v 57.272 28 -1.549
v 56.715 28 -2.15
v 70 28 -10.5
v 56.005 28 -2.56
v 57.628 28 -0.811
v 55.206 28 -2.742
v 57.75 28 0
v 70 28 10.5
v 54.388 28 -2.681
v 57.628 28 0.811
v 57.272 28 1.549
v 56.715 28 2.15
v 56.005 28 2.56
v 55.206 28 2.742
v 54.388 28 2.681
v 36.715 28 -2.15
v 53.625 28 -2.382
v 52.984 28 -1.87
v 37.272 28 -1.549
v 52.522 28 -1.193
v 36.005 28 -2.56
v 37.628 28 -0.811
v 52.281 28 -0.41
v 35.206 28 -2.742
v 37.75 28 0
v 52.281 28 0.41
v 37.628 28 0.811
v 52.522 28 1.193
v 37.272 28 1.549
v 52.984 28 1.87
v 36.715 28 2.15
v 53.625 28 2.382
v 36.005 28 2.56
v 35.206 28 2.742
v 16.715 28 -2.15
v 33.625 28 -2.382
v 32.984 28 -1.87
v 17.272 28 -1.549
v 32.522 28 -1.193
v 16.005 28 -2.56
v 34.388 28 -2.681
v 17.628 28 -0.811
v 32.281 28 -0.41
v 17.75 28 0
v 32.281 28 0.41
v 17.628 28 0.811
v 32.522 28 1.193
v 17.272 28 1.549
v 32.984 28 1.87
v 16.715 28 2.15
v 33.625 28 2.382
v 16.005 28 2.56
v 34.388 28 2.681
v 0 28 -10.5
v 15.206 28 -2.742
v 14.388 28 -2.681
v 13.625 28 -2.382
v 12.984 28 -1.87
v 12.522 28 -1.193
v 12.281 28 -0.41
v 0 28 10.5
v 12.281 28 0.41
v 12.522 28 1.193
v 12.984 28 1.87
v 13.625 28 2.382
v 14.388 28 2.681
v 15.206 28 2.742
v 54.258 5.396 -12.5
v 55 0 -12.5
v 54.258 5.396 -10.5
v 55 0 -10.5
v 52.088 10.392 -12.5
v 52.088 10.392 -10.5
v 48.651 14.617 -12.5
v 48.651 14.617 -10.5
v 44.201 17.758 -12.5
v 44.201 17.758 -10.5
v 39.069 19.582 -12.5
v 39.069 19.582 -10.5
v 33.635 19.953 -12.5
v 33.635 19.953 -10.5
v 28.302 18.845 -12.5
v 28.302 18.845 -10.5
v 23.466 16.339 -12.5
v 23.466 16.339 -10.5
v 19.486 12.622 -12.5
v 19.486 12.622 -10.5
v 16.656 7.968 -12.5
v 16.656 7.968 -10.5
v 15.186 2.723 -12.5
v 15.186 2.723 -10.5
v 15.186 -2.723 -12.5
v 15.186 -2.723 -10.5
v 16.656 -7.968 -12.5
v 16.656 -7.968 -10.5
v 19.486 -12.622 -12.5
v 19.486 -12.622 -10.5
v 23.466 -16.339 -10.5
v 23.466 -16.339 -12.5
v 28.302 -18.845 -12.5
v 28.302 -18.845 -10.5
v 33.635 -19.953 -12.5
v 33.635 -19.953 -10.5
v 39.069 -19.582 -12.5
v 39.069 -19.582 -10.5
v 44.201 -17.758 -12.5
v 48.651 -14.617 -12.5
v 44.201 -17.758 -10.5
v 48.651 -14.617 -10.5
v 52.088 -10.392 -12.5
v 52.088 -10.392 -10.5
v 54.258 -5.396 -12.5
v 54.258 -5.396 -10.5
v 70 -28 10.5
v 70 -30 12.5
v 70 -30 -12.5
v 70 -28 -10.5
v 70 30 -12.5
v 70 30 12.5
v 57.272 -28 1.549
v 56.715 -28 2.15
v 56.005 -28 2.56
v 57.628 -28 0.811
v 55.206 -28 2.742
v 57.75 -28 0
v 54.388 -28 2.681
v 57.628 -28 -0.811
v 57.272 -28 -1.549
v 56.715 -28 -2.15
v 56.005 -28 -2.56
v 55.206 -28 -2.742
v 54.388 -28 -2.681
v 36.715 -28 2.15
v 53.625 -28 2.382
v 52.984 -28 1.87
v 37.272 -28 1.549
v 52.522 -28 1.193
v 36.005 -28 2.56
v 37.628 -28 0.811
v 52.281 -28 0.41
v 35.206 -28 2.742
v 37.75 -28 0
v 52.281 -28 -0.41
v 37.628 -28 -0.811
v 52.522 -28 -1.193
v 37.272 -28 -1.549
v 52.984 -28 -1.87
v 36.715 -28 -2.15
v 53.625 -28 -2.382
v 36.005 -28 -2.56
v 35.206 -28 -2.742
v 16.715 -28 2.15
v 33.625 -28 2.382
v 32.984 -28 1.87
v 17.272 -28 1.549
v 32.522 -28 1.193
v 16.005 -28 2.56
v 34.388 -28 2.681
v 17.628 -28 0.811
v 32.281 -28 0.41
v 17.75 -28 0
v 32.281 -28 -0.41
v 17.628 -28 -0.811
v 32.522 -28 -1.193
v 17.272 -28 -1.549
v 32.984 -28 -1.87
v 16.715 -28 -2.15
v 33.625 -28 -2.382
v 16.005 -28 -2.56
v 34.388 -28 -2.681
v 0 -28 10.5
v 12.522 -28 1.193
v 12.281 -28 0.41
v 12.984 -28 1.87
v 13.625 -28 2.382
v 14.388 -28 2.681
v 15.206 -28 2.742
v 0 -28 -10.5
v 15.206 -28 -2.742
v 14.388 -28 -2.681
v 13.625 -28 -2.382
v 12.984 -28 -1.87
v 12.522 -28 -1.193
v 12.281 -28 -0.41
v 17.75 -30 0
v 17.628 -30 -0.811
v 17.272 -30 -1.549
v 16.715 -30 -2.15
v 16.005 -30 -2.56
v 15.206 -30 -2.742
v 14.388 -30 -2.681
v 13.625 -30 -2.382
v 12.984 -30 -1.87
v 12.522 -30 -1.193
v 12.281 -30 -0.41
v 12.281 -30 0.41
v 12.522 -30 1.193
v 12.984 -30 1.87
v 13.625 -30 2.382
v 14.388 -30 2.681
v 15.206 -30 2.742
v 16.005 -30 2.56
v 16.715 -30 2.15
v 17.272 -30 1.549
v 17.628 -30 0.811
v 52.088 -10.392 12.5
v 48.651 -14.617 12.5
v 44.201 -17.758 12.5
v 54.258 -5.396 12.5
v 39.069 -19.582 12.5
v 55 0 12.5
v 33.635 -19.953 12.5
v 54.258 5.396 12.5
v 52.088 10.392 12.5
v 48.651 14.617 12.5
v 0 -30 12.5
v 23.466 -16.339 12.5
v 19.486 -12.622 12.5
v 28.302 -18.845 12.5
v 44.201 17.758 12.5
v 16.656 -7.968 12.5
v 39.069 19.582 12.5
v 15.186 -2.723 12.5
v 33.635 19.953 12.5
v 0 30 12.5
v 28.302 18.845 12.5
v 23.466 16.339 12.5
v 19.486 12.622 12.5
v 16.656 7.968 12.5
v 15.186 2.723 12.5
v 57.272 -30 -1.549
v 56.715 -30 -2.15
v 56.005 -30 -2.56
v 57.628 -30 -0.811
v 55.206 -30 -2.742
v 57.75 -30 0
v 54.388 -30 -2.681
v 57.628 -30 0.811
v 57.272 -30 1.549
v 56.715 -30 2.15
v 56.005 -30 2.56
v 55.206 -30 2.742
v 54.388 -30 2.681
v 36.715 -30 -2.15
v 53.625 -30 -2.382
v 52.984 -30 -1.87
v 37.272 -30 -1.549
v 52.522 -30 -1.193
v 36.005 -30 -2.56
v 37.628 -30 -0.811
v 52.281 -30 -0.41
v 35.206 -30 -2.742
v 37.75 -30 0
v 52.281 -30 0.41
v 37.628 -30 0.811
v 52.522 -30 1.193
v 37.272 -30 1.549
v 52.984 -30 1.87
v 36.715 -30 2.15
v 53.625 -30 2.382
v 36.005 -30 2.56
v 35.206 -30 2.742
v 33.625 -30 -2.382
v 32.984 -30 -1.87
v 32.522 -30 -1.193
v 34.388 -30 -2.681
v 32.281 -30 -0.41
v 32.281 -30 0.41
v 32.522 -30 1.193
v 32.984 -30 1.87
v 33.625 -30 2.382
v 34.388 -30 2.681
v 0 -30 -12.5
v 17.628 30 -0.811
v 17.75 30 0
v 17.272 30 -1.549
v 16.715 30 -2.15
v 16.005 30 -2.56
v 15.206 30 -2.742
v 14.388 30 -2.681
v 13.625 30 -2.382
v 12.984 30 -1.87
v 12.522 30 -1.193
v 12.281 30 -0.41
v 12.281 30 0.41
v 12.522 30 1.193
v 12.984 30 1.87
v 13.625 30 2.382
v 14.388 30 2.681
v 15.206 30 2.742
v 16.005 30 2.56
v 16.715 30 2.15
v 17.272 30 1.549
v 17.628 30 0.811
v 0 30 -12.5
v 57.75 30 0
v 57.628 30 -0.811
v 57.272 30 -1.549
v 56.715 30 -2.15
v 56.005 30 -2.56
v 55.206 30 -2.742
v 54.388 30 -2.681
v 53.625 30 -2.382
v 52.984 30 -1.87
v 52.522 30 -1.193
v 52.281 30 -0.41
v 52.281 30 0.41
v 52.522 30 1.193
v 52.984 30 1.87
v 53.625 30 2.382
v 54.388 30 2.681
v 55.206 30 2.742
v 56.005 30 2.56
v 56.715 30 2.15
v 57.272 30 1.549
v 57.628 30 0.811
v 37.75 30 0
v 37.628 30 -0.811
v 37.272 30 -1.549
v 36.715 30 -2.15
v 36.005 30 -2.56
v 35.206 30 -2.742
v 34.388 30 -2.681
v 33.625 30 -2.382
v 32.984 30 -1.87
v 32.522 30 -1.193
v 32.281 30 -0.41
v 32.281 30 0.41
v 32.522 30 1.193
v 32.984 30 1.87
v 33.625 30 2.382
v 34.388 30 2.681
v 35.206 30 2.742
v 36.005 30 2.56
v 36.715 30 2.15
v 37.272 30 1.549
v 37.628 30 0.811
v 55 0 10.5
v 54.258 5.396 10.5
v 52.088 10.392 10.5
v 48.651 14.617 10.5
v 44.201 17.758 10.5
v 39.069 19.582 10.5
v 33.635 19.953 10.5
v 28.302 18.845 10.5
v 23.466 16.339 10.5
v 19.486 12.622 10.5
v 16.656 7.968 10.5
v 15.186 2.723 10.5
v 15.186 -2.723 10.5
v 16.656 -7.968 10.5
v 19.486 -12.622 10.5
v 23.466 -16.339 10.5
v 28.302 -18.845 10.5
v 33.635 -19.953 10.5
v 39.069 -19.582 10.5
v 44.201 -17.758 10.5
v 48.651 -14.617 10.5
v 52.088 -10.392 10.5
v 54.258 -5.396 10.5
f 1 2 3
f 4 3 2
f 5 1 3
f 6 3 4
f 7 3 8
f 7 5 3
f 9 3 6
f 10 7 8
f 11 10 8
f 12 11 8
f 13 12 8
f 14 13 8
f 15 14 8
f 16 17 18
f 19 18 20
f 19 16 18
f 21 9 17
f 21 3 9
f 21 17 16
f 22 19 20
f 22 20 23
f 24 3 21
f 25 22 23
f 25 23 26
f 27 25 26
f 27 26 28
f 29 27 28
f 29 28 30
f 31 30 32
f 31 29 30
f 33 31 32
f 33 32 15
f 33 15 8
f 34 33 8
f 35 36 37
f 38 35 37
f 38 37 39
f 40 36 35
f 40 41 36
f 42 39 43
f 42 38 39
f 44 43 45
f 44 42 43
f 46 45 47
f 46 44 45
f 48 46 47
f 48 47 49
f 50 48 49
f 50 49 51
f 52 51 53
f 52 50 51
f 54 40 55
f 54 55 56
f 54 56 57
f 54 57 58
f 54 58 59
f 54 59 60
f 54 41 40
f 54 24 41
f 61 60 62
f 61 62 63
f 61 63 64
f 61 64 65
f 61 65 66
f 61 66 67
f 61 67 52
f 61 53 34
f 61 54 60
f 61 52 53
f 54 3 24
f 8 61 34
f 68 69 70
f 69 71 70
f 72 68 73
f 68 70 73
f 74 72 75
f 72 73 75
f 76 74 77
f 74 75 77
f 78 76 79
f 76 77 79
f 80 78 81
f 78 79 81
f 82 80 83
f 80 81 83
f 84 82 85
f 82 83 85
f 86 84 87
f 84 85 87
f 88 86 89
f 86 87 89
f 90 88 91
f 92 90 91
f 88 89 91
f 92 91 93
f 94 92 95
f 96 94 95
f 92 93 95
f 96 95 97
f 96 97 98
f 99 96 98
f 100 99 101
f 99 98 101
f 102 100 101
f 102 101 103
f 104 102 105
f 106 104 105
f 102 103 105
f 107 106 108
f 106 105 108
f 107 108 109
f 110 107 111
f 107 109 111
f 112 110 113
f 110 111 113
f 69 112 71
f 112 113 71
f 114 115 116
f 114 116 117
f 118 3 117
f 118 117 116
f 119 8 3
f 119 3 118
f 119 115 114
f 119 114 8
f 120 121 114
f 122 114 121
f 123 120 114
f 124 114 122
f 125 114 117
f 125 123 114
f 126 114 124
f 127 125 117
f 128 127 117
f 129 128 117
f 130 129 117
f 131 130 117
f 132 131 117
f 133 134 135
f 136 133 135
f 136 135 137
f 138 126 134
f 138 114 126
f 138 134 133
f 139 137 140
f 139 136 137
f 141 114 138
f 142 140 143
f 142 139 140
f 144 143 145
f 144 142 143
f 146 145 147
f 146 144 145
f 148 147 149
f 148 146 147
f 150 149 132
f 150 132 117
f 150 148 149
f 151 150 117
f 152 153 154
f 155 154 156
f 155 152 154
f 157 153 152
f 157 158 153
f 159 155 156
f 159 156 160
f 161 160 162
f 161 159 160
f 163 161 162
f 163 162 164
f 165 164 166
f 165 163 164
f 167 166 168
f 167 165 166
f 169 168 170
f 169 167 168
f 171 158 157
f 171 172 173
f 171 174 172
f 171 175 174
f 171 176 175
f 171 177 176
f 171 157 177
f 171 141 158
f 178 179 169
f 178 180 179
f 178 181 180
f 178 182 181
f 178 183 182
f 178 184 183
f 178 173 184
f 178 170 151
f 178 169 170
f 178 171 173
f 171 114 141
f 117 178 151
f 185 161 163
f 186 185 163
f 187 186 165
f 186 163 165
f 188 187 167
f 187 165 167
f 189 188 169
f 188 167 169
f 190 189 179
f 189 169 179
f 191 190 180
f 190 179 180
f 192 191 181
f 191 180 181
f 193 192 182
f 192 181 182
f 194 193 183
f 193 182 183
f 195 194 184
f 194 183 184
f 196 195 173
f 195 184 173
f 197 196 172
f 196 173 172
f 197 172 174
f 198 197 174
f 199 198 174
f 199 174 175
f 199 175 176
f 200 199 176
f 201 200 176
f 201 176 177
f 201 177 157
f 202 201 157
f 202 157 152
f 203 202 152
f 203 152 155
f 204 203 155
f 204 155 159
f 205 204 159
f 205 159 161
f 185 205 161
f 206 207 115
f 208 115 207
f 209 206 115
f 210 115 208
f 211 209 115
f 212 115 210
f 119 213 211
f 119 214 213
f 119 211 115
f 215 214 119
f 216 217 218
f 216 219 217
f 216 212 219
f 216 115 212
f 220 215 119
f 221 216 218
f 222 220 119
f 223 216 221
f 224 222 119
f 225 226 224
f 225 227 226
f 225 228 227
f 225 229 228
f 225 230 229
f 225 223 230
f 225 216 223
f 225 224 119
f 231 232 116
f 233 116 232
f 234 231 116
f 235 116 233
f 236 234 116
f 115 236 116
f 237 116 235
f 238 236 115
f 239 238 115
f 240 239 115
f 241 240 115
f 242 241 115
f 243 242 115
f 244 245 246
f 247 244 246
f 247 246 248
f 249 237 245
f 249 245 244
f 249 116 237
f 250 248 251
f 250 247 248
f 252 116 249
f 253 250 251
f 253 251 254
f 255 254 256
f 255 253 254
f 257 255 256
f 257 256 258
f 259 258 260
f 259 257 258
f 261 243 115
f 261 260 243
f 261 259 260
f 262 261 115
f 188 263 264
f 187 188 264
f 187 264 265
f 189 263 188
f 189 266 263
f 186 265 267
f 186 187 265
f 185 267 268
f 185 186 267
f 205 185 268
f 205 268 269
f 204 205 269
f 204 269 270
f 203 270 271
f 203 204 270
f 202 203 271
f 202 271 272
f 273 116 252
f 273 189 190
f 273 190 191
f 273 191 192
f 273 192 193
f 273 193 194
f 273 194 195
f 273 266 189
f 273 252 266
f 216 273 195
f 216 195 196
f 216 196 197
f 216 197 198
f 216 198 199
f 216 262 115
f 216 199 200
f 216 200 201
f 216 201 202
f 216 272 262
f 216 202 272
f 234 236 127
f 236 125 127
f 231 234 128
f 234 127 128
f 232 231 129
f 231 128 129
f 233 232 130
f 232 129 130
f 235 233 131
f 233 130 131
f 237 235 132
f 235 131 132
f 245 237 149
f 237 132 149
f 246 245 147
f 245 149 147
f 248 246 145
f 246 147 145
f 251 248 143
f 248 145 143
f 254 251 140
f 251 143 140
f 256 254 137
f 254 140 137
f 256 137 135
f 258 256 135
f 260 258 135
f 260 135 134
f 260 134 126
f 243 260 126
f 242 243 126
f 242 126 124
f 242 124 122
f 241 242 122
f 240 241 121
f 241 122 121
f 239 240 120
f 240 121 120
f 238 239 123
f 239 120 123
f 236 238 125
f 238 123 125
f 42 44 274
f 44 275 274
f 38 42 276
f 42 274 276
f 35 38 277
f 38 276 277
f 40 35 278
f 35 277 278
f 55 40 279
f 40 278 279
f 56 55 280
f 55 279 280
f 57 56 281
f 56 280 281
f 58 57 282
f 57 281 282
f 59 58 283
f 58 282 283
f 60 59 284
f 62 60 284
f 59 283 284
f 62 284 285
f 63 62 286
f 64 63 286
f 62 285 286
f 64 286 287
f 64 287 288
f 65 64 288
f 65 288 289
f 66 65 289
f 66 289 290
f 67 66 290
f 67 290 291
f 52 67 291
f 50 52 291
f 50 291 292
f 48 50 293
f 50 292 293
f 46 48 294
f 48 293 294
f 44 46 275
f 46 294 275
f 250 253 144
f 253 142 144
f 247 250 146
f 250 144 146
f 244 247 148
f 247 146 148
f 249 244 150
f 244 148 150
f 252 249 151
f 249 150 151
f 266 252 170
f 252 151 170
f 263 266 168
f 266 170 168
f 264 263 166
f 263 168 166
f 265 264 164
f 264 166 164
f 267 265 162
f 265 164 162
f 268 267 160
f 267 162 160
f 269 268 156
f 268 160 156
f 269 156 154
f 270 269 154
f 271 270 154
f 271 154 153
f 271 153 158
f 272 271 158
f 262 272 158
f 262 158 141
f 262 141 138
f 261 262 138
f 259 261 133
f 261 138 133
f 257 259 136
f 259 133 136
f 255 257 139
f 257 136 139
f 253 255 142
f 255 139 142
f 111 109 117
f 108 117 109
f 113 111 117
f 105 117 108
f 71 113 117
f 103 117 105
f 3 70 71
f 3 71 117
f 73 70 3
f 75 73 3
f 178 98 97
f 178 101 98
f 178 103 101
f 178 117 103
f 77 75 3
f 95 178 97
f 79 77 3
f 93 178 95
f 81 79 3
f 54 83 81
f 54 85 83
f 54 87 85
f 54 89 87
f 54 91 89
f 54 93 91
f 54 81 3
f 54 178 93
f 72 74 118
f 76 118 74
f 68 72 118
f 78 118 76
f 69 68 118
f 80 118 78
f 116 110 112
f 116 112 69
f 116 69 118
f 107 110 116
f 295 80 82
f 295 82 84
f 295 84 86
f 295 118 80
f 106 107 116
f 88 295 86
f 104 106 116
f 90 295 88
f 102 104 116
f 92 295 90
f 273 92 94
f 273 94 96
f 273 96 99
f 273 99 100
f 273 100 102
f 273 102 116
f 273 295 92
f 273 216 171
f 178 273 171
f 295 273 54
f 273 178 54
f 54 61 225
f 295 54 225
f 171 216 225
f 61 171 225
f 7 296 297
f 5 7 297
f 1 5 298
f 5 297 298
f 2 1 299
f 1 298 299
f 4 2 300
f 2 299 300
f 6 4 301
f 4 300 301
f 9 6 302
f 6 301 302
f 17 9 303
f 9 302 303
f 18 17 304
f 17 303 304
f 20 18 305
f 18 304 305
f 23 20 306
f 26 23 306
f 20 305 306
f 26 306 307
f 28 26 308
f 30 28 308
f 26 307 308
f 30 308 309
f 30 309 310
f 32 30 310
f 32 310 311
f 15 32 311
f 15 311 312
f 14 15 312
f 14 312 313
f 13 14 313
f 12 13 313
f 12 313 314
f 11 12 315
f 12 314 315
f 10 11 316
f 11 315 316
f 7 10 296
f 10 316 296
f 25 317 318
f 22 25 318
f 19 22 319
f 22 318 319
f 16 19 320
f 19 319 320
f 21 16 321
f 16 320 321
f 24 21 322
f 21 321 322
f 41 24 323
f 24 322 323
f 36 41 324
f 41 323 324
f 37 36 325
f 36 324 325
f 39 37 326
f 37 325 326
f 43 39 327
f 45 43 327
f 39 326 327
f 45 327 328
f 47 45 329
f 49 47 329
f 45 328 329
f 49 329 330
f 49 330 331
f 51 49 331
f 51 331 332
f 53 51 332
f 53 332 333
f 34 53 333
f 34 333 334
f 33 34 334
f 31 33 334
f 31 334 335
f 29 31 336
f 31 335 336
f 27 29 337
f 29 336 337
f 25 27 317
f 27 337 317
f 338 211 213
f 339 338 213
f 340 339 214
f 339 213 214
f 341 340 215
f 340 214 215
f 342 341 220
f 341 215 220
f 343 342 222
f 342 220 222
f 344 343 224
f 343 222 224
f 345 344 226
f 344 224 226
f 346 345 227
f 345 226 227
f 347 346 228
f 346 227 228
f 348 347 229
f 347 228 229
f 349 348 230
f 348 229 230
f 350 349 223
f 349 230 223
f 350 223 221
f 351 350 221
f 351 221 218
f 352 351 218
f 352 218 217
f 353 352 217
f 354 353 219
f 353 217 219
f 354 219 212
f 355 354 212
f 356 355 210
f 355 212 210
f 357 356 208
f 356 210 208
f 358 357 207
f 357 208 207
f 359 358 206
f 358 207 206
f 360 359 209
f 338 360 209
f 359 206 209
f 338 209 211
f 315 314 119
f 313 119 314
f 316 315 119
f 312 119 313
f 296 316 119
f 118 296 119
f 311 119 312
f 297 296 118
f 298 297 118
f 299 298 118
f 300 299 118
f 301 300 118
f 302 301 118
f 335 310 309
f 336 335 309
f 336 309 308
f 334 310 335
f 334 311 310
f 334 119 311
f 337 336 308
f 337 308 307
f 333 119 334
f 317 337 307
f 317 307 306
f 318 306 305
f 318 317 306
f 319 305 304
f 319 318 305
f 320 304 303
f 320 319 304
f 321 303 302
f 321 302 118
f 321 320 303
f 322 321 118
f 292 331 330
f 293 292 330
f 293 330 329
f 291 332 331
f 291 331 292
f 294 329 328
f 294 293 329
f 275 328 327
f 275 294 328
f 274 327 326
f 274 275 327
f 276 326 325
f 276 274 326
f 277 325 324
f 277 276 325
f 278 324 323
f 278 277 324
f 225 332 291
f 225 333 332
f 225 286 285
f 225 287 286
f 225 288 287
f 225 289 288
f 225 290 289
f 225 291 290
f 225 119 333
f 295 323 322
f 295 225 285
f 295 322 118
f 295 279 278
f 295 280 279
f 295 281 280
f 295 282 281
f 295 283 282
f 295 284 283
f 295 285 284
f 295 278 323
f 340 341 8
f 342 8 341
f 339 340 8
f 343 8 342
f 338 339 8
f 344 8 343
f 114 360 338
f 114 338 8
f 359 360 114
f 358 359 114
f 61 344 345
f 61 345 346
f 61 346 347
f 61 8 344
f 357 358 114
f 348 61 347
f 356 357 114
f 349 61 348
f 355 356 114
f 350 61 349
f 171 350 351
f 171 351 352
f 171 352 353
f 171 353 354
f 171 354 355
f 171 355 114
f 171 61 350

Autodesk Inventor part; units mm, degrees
ref_plane "YZ Plane" through (0, 0, 0) normal (1, 0, 0) x (0, 1, 0)
ref_plane "XZ Plane" through (0, 0, 0) normal (0, 1, 0) x (-1, 0, 0)
ref_plane "XY Plane" through (0, 0, 0) normal (0, 0, 1) x (1, 0, 0)
sketch "Sketch1" plane through (0, 0, 0) normal (1, 0, 0) x (0, 1, 0)
  line L0 (-30, 12.5) -> (30, 12.5)
  line L1 (30, 12.5) -> (30, -12.5)
  line L2 (30, -12.5) -> (-30, -12.5)
  line L3 (-30, -12.5) -> (-30, 12.5)
  line L4 (-30, 12.5) -> (30, -12.5) construction
  line L5 (30, 12.5) -> (-30, -12.5) construction
  line L6 (28, -10.5) -> (28, 10.5)
  line L7 (28, 10.5) -> (-28, 10.5)
  line L8 (-28, 10.5) -> (-28, -10.5)
  line L9 (-28, -10.5) -> (28, -10.5)
  point P0 (0, 0)
  dimension "d0" = 60
  dimension "d1" = 25
  dimension "d2" = 2
extrude "Extrusion1" add sketch "Sketch1" along normal blind 70
sketch "Sketch2" plane through (0, 30, 12.5) normal (0, 1, 0) x (1, 0, 0)
  circle A0 centre (15, 12.5) radius 2.75
  circle A1 centre (35, 12.5) radius 2.75
  circle A2 centre (55, 12.5) radius 2.75
  line L0 (0, 0) -> (0, 25) projected
  line L1 (15, 12.5) -> (55, 12.5) construction
  point P0 (0, 12.5)
  point P1 (0, 12.5)
  dimension "d5" = 5.5
  dimension "d6" = 5.5
  dimension "d7" = 5.5
  dimension "d8" = 20
  dimension "d9" = 20
  dimension "d10" = 15
  dimension "d11" = 40
extrude "Extrusion2" cut sketch "Sketch2" against normal through all
sketch "Sketch3" plane through (0, -30, 12.5) normal (0, 0, 1) x (1, 0, 0)
  circle A0 centre (35, 30) radius 20
  line L0 (70, 60) -> (70, 0) projected
  line L1 (0, 0) -> (70, 0) projected
  point P0 (0, 30)
  dimension "d14" = 40
  dimension "d15" = 35
  dimension "d16" = 30
extrude "Extrusion3" cut sketch "Sketch3" against normal blind 30
properties part number "Bumper Support" material "Aluminum 6061"
